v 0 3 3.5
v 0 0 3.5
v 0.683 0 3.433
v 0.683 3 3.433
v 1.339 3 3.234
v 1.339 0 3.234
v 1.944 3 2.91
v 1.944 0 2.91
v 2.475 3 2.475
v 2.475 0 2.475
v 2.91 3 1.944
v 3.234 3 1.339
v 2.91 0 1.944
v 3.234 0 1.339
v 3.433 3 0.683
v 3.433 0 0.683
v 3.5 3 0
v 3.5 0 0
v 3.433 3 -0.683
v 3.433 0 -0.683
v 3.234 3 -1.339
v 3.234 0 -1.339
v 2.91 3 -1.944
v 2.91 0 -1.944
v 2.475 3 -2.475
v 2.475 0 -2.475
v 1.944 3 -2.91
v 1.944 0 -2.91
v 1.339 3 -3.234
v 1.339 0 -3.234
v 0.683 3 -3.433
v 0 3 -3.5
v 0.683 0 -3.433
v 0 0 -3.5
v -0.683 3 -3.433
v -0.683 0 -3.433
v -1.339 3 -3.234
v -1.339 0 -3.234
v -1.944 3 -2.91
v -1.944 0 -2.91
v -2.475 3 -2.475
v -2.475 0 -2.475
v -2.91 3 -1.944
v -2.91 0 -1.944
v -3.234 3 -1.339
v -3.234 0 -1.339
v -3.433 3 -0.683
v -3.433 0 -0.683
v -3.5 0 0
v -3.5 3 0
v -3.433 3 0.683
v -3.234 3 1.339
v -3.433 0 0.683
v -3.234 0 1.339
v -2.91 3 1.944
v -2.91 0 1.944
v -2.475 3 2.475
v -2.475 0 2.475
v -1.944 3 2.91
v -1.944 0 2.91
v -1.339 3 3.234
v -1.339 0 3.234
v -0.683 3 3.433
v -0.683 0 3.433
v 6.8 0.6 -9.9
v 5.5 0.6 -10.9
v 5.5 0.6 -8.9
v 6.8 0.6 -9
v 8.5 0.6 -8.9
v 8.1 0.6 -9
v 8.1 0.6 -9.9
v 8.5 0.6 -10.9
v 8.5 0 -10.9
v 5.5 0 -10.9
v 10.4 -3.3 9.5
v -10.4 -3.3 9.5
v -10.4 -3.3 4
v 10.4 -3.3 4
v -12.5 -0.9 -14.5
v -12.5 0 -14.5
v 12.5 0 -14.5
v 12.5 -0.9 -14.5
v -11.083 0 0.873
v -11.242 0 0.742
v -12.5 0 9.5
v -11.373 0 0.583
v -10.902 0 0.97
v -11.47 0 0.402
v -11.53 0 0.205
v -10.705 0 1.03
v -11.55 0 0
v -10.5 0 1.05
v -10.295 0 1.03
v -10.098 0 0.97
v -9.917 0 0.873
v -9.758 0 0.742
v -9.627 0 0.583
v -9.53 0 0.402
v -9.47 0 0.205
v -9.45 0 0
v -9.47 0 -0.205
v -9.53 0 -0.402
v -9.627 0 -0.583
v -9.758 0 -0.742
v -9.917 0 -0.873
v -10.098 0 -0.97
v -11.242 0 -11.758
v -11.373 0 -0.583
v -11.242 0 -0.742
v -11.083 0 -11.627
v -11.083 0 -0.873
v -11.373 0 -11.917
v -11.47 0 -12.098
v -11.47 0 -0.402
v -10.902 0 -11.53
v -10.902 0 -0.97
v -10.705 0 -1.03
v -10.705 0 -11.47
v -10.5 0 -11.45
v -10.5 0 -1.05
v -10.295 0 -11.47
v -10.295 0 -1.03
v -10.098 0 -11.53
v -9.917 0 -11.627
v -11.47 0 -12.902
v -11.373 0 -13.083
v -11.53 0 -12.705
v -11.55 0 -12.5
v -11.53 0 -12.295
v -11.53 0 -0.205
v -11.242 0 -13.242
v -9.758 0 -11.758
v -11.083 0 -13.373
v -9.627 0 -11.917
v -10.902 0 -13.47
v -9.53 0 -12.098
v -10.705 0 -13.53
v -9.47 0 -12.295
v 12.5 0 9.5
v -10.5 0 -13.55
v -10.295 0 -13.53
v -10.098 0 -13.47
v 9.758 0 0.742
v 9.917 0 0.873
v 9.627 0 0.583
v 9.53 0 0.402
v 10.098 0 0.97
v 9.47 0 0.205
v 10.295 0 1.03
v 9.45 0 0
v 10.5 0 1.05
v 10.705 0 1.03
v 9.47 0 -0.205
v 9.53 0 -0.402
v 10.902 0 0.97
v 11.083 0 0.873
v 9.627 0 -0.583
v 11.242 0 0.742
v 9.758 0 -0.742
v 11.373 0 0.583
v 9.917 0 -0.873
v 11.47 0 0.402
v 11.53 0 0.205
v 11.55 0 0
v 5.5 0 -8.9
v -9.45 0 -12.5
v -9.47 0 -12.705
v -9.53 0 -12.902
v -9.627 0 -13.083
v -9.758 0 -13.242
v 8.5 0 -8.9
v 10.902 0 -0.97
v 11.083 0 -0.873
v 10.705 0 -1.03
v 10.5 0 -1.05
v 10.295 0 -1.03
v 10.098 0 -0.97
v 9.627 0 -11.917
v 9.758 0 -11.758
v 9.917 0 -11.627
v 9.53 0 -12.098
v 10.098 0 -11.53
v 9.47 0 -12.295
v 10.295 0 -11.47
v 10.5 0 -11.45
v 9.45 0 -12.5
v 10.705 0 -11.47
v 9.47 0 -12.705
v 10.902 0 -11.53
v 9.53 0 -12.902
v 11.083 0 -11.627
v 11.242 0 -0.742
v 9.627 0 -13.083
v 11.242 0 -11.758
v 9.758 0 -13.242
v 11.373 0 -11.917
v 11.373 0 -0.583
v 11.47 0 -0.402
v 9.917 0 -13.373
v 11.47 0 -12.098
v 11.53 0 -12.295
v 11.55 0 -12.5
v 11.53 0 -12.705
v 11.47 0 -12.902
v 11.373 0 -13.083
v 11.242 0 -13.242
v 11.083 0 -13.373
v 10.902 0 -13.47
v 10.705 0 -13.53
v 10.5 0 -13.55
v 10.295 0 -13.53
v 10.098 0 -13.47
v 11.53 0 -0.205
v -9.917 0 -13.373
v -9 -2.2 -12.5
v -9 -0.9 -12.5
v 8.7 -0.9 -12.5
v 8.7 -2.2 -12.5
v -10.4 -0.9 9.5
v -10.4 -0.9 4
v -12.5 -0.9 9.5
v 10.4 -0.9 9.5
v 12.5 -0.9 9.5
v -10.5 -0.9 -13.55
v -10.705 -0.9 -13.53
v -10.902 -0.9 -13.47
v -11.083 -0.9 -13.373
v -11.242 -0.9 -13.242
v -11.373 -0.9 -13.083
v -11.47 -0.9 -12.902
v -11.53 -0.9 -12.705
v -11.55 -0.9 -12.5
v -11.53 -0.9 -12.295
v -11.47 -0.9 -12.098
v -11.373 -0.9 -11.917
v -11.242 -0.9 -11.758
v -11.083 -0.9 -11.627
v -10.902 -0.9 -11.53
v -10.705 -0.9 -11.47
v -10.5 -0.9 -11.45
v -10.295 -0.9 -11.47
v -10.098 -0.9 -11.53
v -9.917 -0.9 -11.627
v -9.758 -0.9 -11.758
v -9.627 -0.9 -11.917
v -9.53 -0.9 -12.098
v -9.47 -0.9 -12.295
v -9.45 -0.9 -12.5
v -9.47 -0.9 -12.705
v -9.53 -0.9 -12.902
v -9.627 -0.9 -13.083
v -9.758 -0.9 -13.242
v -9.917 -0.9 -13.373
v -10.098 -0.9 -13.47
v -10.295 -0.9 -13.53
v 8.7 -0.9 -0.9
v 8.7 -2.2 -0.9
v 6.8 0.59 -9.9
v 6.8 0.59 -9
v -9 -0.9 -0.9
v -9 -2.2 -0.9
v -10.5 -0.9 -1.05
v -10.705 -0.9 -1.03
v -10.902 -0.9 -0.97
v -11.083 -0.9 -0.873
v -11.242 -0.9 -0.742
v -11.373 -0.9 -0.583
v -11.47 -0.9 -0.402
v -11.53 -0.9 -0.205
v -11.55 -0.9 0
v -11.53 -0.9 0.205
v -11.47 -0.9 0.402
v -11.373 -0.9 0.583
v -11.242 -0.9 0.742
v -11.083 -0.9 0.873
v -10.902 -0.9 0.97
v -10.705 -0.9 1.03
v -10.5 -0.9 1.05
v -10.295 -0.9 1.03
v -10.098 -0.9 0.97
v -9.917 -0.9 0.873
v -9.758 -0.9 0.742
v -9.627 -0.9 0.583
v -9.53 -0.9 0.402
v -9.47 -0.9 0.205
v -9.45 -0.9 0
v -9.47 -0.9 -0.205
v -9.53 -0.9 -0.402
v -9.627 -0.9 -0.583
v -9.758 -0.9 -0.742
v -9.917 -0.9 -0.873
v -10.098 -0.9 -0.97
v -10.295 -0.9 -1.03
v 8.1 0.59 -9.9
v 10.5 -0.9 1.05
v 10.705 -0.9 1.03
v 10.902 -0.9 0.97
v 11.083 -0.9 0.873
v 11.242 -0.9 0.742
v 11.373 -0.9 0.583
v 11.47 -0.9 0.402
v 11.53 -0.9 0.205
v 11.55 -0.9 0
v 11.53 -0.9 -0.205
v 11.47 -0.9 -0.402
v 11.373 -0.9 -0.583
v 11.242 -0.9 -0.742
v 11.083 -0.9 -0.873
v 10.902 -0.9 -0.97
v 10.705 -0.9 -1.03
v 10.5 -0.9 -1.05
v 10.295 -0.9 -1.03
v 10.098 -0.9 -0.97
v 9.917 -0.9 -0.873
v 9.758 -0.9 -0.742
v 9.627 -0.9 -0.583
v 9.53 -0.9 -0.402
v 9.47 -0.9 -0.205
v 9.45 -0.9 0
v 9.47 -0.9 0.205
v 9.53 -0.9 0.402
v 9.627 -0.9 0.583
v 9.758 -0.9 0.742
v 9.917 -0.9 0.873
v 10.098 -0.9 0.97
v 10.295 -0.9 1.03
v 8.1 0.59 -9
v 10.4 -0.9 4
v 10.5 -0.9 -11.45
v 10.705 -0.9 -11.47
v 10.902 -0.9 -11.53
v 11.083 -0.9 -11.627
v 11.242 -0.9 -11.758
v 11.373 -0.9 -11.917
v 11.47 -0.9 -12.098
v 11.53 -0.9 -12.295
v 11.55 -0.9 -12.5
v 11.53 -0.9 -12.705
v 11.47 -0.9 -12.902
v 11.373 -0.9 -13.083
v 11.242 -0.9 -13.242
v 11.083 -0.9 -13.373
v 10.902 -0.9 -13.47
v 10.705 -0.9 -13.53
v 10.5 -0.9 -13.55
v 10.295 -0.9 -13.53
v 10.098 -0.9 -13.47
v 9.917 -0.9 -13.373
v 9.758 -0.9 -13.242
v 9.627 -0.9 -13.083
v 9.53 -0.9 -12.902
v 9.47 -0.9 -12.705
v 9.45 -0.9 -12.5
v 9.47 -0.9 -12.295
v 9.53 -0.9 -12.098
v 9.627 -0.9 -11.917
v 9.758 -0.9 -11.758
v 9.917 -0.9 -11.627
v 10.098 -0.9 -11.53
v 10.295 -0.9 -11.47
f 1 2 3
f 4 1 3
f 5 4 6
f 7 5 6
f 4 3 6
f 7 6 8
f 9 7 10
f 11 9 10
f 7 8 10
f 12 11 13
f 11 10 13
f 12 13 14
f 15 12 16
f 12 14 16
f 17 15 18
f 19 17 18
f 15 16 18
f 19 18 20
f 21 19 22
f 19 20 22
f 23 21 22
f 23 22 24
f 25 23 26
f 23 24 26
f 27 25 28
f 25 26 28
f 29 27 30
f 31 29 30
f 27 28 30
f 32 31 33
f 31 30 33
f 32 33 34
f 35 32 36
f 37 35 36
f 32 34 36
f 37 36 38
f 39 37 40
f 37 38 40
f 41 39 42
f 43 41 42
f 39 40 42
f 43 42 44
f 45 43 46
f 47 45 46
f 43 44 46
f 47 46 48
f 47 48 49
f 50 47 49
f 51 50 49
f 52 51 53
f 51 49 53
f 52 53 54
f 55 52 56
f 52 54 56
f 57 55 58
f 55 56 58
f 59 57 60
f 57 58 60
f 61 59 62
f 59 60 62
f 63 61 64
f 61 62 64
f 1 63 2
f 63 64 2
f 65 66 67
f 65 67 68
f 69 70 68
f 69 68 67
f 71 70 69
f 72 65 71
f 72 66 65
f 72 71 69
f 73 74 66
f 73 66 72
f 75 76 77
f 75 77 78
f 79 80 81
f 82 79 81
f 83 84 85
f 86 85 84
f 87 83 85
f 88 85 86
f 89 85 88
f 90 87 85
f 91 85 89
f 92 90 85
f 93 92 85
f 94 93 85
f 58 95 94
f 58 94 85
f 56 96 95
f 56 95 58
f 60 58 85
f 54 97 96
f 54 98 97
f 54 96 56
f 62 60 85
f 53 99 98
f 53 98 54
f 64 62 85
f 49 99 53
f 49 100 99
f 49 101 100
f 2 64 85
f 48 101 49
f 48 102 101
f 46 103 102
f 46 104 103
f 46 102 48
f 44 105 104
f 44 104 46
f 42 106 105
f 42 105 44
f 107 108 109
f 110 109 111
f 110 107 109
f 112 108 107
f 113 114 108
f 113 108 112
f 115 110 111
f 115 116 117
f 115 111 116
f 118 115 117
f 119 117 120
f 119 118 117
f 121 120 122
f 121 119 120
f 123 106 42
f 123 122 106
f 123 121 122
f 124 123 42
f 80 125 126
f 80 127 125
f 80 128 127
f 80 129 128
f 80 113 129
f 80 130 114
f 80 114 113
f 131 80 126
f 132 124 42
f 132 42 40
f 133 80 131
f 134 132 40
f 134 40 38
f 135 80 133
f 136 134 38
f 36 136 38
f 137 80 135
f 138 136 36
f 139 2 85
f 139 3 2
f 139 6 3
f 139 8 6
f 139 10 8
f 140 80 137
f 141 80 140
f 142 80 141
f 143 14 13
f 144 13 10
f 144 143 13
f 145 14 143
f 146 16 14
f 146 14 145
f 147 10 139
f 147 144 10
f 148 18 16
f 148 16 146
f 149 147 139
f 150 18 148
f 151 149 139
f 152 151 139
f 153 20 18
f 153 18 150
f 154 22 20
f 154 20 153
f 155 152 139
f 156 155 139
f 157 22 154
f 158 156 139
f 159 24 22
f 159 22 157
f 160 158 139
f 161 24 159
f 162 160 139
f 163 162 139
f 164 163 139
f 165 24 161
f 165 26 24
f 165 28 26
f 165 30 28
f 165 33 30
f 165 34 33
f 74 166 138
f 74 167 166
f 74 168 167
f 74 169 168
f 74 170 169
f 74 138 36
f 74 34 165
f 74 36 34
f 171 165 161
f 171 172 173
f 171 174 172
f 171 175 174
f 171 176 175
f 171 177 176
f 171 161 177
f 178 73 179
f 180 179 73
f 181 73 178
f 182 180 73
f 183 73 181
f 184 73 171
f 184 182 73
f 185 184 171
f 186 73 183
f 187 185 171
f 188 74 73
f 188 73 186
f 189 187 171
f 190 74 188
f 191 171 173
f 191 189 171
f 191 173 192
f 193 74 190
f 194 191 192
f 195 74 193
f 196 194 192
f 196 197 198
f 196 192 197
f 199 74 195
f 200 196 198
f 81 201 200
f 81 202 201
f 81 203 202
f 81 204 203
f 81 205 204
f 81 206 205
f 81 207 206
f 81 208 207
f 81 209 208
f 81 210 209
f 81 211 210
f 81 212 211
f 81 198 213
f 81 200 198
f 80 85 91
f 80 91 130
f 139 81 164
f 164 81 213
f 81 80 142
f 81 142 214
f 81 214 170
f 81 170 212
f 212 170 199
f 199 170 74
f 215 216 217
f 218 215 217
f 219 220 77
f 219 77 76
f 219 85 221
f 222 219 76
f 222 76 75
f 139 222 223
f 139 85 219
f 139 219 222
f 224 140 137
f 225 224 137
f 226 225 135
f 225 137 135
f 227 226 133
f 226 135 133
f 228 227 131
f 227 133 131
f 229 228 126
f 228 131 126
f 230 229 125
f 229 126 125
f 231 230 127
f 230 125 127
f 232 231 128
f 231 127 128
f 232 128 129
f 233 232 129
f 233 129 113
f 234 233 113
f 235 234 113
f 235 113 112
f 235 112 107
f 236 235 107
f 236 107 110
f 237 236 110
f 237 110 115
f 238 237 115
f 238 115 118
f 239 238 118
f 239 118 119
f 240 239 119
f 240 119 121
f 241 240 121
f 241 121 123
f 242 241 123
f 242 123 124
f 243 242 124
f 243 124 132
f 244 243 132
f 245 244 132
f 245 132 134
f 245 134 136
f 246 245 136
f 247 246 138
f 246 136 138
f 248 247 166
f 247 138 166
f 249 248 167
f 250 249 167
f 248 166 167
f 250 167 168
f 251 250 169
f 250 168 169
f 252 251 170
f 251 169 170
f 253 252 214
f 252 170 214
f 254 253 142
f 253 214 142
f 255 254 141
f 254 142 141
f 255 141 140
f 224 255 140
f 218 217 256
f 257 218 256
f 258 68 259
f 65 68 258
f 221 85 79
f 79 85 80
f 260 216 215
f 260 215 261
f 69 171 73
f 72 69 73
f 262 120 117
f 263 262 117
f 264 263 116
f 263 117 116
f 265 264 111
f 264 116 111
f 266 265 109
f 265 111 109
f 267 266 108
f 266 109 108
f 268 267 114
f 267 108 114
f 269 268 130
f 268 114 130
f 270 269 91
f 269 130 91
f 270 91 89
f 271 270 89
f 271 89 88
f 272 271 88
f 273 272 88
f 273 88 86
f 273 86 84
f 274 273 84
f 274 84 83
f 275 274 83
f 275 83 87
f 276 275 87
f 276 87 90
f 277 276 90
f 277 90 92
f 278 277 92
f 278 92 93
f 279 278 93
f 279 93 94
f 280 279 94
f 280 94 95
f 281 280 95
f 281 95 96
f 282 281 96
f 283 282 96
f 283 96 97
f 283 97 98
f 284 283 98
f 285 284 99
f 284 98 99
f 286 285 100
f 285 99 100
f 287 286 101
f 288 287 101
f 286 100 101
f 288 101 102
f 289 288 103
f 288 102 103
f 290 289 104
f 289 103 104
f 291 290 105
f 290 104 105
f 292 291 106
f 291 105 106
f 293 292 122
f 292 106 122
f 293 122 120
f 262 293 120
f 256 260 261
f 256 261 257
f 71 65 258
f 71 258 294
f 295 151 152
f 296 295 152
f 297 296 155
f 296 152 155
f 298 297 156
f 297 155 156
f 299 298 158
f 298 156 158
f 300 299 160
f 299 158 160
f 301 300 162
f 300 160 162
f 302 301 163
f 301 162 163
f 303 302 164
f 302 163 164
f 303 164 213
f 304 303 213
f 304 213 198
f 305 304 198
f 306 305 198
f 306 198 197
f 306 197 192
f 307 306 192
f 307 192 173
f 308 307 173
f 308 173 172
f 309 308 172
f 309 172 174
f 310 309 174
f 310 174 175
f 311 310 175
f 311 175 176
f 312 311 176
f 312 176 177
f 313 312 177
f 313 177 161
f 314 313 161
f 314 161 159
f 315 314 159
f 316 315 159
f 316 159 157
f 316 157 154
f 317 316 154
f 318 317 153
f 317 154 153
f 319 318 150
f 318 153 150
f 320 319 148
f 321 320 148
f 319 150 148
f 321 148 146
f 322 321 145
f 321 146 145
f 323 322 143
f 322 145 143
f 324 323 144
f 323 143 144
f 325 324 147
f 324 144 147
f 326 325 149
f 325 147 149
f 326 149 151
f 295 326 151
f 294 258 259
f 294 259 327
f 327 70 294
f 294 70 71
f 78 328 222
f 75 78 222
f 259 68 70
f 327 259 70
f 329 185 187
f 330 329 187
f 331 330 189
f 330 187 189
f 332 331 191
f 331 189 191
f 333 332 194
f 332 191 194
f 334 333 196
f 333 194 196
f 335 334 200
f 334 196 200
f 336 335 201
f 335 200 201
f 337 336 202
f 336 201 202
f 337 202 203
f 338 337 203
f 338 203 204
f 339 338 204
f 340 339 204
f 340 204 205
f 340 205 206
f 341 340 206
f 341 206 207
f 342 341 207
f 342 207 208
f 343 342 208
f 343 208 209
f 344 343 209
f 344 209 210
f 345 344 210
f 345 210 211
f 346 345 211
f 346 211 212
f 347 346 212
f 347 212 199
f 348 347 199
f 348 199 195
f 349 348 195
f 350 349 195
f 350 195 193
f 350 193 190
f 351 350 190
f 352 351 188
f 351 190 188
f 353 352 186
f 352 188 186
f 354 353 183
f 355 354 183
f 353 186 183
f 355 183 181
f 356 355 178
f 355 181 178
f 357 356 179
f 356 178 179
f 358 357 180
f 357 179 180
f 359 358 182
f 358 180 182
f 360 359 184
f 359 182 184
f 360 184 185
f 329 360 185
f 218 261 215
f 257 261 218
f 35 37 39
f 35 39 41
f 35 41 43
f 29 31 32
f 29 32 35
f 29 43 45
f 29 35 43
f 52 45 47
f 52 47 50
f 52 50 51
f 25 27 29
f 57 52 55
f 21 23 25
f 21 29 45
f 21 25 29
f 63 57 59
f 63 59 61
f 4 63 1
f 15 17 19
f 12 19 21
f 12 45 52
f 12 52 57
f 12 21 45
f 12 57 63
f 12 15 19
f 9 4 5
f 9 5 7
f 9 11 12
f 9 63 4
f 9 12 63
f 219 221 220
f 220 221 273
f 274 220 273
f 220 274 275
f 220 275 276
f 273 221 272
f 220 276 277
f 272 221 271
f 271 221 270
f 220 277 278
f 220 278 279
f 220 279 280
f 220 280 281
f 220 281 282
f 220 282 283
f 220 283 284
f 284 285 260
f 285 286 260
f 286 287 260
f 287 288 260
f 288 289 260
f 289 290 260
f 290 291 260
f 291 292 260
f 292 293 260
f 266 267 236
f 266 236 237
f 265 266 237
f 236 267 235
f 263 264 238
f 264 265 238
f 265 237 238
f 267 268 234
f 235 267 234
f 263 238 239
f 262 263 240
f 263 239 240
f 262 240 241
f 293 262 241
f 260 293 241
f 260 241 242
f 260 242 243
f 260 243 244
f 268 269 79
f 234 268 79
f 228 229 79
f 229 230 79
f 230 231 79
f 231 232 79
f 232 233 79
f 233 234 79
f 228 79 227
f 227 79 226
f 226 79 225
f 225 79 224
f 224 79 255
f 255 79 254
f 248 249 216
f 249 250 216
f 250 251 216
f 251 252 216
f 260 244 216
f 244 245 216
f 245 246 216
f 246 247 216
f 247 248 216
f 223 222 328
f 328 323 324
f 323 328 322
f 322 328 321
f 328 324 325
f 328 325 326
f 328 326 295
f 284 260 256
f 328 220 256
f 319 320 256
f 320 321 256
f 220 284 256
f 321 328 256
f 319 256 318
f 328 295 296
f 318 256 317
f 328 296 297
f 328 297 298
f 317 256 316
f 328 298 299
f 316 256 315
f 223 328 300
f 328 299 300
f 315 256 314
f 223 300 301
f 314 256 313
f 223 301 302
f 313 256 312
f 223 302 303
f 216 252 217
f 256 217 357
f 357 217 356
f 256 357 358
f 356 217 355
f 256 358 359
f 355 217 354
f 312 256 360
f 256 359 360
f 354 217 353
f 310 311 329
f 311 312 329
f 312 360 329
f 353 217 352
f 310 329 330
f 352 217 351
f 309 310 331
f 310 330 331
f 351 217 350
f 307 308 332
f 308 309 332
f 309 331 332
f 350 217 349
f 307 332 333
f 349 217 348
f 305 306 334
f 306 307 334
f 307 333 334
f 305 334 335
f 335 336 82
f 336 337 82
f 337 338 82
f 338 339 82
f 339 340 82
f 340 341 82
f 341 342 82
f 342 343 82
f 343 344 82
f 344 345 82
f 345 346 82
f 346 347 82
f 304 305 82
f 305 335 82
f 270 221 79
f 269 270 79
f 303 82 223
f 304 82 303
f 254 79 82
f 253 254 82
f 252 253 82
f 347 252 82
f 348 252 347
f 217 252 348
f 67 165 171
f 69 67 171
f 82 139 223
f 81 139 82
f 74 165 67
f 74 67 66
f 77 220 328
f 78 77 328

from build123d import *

# Parameters (mm, degrees)
SKIZZE1_W                                 = 25
SKIZZE1_H                                 = 24
PCB_DEPTH                                 = 0.9
SKIZZE2_R                                 = 1.05
MOUNTING_HOLES_DEPTH                      = 20.165333287
SKIZZE3_W                                 = 20.8
SKIZZE3_H                                 = 5.5
CONNECTOR_CLOSED_DEPTH                    = 2.4
SKIZZE4_W                                 = 17.7
SKIZZE4_H                                 = 11.6
COMPONENTS_WORST_CASE_BOUNDARY_BOX_DEPTH  = 1.3
SKIZZE7_W                                 = 3
SKIZZE7_H                                 = 2
COMPONENTS_WORST_CASE_BOUNDARY_BOX2_DEPTH = 0.6
SKIZZE8_W                                 = 1.3
SKIZZE8_H                                 = 0.9
STATUS_LED_DEPTH                          = 0.01
ESBO_O1_R                                 = 3.5
RESSALTO_EXTRUS_O2_DEPTH                  = 3


with BuildPart() as part:
    # Skizze1 → PCB (new body)
    with BuildSketch(Plane(origin=(0, 0, 0), x_dir=(1, 0, 0), z_dir=(0, 1, 0))):
        with Locations((0, 2.5)):
            Rectangle(SKIZZE1_W, SKIZZE1_H)
    extrude(amount=-PCB_DEPTH)

    # Skizze2 → Mounting_Holes (cut, through all)
    with BuildSketch(Plane(origin=(0, 0, 0), x_dir=(1, 0, 0), z_dir=(0, 1, 0))):
        with Locations(Location((10.5, 12.5, 0), (0, 0, 270))):
            Circle(SKIZZE2_R)
        with Locations(Location((10.5, 0, 0), (0, 0, 270))):
            Circle(SKIZZE2_R)
        with Locations(Location((-10.5, 0, 0), (0, 0, 90))):
            Circle(SKIZZE2_R)
        with Locations(Location((-10.5, 12.5, 0), (0, 0, 90))):
            Circle(SKIZZE2_R)
    extrude(amount=-MOUNTING_HOLES_DEPTH, mode=Mode.SUBTRACT)

    # Skizze3 → Connector_closed (add)
    with BuildSketch(Plane.XZ.offset(0.9)):
        with Locations((0, 6.75)):
            Rectangle(SKIZZE3_W, SKIZZE3_H)
    extrude(amount=CONNECTOR_CLOSED_DEPTH)

    # Skizze4 → Components_worst-case_Boundary-Box (add)
    with BuildSketch(Plane.XZ.offset(0.9)):
        with Locations((-0.15, -6.7)):
            Rectangle(SKIZZE4_W, SKIZZE4_H)
    extrude(amount=COMPONENTS_WORST_CASE_BOUNDARY_BOX_DEPTH)

    # Skizze7 → Components_worst-case_Boundary-Box2 (add)
    with BuildSketch(Plane(origin=(0, 0, 0), x_dir=(1, 0, 0), z_dir=(0, 1, 0))):
        with Locations((7, 9.9)):
            Rectangle(SKIZZE7_W, SKIZZE7_H)
    extrude(amount=COMPONENTS_WORST_CASE_BOUNDARY_BOX2_DEPTH)

    # Skizze8 → Status_LED (cut)
    with BuildSketch(Plane(origin=(0, 0.6, 0), x_dir=(1, 0, 0), z_dir=(0, 1, 0))):
        with Locations((7.45, 9.45)):
            Rectangle(SKIZZE8_W, SKIZZE8_H)
    extrude(amount=-STATUS_LED_DEPTH, mode=Mode.SUBTRACT)

    # Esboço1 → Ressalto-extrusão2 (add)
    with BuildSketch(Plane(origin=(0, 0, 0), x_dir=(1, 0, 0), z_dir=(0, 1, 0))):
        with Locations(Location((0, 0, 0), (0, 0, 270))):
            Circle(ESBO_O1_R)
    extrude(amount=RESSALTO_EXTRUS_O2_DEPTH)


solid = part.part
